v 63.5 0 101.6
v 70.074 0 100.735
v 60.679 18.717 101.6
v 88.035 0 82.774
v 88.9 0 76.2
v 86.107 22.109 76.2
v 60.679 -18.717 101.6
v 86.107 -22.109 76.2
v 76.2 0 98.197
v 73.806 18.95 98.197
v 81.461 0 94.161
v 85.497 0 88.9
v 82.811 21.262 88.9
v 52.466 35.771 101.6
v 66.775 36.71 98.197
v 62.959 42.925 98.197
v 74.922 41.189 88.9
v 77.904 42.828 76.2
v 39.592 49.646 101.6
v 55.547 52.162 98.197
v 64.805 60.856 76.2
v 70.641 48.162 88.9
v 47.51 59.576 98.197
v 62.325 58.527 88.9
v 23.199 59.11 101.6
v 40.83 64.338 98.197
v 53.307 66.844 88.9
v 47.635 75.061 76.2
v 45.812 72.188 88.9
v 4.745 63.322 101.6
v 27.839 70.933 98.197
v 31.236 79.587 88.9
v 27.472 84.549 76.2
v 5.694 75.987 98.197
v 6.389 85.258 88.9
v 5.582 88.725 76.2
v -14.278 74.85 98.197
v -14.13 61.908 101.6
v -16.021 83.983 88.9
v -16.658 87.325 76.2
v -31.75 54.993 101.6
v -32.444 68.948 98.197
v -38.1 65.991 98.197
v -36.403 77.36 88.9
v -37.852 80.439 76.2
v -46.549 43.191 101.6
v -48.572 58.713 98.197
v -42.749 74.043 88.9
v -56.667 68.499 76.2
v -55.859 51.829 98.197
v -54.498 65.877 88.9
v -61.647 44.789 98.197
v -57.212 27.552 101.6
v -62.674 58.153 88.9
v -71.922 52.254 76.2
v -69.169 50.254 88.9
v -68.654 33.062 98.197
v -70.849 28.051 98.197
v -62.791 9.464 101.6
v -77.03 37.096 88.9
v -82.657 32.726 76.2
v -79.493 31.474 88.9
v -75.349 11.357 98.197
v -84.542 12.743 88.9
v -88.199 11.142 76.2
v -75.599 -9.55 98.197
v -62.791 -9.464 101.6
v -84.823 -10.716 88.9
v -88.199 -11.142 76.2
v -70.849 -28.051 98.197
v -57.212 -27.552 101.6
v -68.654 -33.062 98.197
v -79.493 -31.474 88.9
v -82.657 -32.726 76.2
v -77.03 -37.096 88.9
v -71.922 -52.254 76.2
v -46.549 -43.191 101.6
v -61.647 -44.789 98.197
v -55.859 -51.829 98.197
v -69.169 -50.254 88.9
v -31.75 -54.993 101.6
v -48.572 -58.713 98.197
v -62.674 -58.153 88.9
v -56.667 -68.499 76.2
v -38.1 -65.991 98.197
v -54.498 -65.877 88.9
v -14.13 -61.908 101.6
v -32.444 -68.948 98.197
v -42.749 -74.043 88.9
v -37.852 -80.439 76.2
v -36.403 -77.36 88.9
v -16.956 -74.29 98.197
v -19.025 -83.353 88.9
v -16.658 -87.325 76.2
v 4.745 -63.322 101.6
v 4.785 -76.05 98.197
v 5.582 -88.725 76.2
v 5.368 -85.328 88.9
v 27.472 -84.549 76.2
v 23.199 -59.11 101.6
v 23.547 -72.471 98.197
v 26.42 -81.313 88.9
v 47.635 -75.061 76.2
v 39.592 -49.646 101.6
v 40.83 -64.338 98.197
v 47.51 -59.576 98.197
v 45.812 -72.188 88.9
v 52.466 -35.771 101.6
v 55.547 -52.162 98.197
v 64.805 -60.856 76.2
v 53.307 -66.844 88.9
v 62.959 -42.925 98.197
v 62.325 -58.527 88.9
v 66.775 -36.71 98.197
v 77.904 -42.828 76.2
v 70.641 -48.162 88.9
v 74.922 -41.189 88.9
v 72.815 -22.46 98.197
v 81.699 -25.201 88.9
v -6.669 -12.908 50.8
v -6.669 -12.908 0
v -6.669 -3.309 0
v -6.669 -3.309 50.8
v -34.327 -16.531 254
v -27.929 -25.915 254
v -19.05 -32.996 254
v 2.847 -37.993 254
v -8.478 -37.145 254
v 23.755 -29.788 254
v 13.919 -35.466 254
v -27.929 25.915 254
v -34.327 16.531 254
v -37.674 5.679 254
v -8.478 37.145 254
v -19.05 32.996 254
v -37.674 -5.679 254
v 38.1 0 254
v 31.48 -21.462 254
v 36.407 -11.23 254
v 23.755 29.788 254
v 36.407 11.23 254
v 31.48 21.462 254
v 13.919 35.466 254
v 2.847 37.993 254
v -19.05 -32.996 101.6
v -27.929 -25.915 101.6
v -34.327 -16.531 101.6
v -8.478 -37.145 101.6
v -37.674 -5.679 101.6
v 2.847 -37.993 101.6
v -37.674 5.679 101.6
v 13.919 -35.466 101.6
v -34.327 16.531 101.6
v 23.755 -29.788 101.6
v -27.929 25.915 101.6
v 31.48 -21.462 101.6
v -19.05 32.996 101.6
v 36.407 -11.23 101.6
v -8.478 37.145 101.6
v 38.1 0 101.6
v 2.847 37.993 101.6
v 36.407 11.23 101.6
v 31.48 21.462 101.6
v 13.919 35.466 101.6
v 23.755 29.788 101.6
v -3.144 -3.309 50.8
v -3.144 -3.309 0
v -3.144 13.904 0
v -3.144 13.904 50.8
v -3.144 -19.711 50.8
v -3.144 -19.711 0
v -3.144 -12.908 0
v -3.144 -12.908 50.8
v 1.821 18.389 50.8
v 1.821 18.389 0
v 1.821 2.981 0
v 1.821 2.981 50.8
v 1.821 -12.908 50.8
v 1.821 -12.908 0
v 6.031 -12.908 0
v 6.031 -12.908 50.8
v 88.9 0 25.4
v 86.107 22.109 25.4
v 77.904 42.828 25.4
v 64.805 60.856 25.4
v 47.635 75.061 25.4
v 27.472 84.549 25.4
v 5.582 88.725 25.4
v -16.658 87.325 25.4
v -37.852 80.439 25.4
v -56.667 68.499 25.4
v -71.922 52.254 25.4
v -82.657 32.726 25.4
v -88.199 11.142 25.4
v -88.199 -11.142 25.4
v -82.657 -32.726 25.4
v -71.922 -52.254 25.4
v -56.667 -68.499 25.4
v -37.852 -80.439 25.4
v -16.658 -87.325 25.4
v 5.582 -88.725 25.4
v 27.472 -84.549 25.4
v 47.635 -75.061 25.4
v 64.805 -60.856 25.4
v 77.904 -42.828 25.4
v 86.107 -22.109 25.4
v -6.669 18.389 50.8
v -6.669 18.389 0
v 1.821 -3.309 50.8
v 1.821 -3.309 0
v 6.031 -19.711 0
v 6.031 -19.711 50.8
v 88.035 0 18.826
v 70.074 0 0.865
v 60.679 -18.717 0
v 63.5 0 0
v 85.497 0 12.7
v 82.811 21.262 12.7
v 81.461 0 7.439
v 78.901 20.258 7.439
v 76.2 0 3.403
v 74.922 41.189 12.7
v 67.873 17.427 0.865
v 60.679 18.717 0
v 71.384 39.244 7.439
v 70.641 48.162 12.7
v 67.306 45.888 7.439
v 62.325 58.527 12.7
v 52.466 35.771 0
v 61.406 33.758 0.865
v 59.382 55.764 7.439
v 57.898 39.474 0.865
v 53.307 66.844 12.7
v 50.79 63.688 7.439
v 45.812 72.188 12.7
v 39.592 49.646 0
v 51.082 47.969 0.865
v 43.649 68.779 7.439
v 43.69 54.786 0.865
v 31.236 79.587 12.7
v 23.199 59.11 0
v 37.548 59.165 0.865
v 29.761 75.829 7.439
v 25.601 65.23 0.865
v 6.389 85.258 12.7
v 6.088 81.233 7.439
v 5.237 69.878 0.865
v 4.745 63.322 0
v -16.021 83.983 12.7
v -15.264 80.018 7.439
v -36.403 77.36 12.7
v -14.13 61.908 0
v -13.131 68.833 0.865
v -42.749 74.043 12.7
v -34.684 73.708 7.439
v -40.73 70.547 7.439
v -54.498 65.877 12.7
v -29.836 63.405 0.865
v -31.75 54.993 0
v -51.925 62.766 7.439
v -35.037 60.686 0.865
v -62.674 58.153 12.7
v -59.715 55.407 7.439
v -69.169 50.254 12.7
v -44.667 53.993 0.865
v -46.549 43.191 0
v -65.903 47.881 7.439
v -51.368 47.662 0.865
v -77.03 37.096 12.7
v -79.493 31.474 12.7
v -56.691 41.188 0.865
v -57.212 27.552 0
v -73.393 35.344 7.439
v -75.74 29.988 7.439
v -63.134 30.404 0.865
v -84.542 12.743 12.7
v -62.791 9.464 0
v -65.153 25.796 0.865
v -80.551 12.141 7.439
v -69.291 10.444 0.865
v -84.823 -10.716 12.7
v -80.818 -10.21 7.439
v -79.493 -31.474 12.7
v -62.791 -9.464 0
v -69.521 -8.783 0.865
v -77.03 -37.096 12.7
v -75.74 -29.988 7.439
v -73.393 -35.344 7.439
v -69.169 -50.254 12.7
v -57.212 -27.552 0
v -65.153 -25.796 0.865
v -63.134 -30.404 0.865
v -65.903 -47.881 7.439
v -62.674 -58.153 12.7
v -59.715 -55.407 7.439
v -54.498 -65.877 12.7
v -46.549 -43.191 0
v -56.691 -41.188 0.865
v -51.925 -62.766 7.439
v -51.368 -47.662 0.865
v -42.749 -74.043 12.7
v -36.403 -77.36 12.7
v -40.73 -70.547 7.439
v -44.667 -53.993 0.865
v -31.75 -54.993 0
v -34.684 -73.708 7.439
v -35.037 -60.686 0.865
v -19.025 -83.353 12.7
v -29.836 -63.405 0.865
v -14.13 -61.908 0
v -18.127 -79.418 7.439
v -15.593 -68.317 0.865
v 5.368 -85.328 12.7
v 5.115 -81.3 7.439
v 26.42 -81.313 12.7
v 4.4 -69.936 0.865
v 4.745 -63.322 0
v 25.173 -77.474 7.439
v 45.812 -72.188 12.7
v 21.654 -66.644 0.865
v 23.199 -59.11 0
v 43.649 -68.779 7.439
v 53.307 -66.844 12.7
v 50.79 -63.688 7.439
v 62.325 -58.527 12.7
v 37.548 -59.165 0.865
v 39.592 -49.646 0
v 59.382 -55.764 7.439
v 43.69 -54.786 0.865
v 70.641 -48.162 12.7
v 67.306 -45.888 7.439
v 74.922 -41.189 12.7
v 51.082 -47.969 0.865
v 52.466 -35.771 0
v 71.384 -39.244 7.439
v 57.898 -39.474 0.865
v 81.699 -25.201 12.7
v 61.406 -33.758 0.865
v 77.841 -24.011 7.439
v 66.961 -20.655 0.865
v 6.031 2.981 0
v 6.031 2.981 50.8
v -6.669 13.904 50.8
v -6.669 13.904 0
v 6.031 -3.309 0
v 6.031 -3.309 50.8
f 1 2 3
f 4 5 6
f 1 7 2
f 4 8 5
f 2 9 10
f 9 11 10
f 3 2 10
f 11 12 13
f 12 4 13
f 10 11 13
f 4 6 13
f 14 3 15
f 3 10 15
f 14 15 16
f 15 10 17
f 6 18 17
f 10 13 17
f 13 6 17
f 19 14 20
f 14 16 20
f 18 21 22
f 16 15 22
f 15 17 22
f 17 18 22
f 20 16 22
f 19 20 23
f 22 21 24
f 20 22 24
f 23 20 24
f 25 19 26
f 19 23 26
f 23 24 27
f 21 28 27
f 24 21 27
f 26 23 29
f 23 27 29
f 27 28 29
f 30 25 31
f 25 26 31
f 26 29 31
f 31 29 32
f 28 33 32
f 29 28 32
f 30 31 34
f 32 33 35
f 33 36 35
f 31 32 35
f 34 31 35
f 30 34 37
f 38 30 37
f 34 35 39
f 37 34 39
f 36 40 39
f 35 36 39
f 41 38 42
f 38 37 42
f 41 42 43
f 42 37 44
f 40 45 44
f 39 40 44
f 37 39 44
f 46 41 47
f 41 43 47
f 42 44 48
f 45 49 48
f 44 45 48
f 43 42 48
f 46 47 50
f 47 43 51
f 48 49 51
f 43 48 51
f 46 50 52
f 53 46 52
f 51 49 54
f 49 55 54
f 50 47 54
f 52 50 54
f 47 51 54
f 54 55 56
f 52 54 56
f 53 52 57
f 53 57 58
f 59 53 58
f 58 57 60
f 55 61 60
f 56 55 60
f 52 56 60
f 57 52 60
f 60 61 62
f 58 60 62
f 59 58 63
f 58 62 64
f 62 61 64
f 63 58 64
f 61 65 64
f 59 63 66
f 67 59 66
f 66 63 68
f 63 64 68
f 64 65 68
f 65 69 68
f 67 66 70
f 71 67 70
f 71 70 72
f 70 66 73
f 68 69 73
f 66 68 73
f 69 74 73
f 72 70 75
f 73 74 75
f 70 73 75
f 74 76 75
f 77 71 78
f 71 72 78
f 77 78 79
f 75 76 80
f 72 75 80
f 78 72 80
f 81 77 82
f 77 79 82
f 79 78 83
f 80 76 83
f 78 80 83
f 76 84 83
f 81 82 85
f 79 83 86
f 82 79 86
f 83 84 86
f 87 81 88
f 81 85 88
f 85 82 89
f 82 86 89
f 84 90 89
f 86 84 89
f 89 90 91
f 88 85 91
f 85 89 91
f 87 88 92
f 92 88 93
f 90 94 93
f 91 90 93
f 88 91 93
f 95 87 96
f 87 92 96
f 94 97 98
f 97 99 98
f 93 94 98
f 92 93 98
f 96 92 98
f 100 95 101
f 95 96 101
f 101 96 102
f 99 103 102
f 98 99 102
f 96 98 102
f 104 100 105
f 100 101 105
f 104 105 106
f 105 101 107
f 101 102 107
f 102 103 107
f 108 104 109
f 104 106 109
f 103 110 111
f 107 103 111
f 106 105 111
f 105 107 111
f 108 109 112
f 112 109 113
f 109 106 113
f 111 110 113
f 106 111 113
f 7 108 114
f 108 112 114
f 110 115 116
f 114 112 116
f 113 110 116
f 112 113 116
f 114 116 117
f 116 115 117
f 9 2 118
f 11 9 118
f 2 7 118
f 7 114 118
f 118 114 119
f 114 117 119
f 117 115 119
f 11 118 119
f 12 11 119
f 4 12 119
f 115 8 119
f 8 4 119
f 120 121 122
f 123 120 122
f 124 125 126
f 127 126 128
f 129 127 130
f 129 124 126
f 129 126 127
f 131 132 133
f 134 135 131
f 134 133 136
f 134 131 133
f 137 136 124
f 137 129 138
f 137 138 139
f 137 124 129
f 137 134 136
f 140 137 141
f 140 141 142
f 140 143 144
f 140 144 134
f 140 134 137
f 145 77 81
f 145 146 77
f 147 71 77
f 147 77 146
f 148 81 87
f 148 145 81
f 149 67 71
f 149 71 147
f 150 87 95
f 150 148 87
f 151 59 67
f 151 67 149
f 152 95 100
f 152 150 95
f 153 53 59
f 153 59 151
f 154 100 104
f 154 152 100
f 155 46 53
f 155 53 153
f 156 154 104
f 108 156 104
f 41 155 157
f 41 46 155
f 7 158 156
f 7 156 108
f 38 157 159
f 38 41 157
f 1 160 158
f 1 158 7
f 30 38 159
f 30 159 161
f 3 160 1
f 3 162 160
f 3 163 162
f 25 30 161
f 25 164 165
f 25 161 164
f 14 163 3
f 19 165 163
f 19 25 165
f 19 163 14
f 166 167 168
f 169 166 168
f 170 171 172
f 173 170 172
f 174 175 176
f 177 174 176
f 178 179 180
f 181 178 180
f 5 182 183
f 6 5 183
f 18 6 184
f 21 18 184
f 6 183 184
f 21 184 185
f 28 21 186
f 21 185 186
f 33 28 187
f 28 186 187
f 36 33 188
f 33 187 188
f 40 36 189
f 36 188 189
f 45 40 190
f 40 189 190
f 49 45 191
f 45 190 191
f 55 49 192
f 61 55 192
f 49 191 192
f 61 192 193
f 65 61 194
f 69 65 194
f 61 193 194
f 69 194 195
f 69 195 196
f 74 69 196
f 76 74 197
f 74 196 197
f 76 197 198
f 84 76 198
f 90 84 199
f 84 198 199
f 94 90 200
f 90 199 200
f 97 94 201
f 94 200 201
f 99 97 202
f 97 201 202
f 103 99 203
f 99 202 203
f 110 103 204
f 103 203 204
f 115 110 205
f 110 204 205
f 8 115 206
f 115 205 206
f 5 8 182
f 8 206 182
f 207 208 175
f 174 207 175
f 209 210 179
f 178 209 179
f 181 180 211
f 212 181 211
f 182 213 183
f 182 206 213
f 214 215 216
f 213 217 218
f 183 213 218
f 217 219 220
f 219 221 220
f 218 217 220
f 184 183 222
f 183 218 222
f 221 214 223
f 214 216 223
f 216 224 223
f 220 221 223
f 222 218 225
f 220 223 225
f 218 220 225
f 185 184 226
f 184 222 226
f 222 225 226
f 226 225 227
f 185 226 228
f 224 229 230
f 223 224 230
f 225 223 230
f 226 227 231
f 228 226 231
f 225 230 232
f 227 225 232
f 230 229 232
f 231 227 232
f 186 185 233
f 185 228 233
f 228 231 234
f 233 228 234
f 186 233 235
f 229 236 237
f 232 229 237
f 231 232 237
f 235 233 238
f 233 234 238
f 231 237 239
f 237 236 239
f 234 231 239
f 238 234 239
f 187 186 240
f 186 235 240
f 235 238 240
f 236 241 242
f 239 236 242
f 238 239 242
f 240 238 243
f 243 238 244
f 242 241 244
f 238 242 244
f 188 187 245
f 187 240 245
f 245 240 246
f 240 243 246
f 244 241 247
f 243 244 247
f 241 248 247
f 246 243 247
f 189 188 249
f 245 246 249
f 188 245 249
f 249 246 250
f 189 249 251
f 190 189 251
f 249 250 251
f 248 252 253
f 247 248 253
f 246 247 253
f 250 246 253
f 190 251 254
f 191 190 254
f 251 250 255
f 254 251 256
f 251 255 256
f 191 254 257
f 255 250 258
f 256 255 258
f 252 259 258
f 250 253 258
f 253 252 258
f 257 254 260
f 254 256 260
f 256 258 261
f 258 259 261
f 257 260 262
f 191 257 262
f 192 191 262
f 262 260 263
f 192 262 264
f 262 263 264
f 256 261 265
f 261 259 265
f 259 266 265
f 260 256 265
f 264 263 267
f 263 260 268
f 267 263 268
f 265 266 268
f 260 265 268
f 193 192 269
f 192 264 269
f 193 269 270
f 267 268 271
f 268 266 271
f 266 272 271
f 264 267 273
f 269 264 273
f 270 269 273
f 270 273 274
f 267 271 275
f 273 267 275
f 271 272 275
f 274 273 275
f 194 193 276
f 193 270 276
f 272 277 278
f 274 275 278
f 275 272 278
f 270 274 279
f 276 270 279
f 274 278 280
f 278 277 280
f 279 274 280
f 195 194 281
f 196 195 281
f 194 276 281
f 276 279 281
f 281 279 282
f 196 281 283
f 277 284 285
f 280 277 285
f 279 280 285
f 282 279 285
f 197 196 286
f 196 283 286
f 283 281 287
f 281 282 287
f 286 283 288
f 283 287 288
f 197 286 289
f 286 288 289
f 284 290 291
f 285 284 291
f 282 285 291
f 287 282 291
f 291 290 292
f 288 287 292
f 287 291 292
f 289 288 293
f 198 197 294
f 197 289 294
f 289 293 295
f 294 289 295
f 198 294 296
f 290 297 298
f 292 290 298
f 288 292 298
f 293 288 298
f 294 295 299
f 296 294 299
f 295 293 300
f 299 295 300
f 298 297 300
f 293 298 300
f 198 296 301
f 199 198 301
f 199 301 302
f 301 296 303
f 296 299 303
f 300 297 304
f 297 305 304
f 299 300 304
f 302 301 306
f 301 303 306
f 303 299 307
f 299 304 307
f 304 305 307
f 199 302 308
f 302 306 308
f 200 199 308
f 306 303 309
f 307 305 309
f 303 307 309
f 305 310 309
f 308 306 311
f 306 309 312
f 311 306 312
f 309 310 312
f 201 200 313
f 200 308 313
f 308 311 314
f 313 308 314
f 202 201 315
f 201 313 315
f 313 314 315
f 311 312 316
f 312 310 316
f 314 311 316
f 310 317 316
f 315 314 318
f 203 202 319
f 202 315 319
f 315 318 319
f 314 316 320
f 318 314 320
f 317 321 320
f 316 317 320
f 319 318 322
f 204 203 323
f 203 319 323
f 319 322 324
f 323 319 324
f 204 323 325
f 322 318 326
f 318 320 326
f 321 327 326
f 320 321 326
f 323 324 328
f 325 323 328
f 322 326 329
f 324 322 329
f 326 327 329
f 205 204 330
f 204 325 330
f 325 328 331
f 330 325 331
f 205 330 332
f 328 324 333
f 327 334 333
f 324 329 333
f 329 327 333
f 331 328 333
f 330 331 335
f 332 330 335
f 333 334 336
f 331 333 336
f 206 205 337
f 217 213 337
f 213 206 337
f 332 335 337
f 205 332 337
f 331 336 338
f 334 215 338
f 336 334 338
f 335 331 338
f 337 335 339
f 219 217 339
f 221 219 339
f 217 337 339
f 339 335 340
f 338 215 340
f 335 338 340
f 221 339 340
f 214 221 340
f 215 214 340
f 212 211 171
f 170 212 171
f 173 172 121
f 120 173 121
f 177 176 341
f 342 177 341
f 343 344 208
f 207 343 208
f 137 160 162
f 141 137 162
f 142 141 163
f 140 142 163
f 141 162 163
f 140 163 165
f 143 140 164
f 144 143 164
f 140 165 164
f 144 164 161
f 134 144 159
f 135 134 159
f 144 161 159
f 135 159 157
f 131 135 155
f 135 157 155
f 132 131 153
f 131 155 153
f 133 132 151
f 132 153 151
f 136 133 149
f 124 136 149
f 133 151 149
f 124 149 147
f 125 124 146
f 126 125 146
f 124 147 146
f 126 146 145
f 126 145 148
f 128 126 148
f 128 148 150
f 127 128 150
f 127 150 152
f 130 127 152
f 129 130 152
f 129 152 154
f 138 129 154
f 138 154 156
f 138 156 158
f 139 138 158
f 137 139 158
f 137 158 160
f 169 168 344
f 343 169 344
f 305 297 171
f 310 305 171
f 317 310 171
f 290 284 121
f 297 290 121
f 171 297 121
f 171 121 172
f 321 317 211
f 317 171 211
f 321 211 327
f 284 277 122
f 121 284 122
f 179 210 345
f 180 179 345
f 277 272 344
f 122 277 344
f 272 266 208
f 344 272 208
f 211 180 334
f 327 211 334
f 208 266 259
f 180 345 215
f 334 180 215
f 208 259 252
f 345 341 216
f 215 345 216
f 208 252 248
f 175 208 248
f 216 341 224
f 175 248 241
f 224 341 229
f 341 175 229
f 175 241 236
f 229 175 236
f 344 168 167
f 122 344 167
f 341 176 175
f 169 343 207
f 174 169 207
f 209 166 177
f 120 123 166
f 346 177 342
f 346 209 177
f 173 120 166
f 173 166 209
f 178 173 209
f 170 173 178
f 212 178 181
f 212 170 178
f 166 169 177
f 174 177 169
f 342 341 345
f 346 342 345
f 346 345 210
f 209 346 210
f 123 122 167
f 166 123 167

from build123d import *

# Parameters (mm, degrees)
F0_R     = 88.9
F0_R_2   = 38.1
F1_DEPTH = 101.6
F2_DEPTH = 254
F3_R     = 25.4
F4_R     = 25.4
F6_DEPTH = 50.8


with BuildPart() as f1:
    # F0 (on Top) → F1 (new body)
    with BuildSketch(Plane.XY):
        Circle(F0_R)
        Circle(F0_R_2, mode=Mode.SUBTRACT)
    extrude(amount=F1_DEPTH)

    # F0 (on Top) → F2 (join)
    with BuildSketch(Plane.XY):
        Circle(F0_R_2)
    extrude(amount=F2_DEPTH)

    # F3
    f3_edges = [f1.edges().sort_by_distance(p)[0] for p in [
        (-88.9, 0, 101.6),
    ]]
    fillet(f3_edges, radius=F3_R)

    # F4
    f4_edges = [f1.edges().sort_by_distance(p)[0] for p in [
        (-88.9, 0, 0),
    ]]
    fillet(f4_edges, radius=F4_R)

    # F5 (on face) → F6 (cut)
    with BuildSketch(Plane(origin=(0, 0, 0), x_dir=(1, 0, 0), z_dir=(0, 0, -1))):
        Polygon((6.030925, 19.711075), (-3.144438, 19.711075), (-3.144438, 12.908415), (-6.669075, 12.908415), (-6.669075, 3.30908), (-3.144438, 3.30908), (-3.144438, -13.90423), (-6.669075, -13.90423), (-6.669075, -18.388925), (1.821126, -18.388925), (1.821126, -2.981285), (6.030925, -2.981285), (6.030925, 3.30908), (1.821126, 3.30908), (1.821126, 12.908415), (6.030925, 12.908415), align=None)
    extrude(amount=-F6_DEPTH, mode=Mode.SUBTRACT)


solid = f1.part
